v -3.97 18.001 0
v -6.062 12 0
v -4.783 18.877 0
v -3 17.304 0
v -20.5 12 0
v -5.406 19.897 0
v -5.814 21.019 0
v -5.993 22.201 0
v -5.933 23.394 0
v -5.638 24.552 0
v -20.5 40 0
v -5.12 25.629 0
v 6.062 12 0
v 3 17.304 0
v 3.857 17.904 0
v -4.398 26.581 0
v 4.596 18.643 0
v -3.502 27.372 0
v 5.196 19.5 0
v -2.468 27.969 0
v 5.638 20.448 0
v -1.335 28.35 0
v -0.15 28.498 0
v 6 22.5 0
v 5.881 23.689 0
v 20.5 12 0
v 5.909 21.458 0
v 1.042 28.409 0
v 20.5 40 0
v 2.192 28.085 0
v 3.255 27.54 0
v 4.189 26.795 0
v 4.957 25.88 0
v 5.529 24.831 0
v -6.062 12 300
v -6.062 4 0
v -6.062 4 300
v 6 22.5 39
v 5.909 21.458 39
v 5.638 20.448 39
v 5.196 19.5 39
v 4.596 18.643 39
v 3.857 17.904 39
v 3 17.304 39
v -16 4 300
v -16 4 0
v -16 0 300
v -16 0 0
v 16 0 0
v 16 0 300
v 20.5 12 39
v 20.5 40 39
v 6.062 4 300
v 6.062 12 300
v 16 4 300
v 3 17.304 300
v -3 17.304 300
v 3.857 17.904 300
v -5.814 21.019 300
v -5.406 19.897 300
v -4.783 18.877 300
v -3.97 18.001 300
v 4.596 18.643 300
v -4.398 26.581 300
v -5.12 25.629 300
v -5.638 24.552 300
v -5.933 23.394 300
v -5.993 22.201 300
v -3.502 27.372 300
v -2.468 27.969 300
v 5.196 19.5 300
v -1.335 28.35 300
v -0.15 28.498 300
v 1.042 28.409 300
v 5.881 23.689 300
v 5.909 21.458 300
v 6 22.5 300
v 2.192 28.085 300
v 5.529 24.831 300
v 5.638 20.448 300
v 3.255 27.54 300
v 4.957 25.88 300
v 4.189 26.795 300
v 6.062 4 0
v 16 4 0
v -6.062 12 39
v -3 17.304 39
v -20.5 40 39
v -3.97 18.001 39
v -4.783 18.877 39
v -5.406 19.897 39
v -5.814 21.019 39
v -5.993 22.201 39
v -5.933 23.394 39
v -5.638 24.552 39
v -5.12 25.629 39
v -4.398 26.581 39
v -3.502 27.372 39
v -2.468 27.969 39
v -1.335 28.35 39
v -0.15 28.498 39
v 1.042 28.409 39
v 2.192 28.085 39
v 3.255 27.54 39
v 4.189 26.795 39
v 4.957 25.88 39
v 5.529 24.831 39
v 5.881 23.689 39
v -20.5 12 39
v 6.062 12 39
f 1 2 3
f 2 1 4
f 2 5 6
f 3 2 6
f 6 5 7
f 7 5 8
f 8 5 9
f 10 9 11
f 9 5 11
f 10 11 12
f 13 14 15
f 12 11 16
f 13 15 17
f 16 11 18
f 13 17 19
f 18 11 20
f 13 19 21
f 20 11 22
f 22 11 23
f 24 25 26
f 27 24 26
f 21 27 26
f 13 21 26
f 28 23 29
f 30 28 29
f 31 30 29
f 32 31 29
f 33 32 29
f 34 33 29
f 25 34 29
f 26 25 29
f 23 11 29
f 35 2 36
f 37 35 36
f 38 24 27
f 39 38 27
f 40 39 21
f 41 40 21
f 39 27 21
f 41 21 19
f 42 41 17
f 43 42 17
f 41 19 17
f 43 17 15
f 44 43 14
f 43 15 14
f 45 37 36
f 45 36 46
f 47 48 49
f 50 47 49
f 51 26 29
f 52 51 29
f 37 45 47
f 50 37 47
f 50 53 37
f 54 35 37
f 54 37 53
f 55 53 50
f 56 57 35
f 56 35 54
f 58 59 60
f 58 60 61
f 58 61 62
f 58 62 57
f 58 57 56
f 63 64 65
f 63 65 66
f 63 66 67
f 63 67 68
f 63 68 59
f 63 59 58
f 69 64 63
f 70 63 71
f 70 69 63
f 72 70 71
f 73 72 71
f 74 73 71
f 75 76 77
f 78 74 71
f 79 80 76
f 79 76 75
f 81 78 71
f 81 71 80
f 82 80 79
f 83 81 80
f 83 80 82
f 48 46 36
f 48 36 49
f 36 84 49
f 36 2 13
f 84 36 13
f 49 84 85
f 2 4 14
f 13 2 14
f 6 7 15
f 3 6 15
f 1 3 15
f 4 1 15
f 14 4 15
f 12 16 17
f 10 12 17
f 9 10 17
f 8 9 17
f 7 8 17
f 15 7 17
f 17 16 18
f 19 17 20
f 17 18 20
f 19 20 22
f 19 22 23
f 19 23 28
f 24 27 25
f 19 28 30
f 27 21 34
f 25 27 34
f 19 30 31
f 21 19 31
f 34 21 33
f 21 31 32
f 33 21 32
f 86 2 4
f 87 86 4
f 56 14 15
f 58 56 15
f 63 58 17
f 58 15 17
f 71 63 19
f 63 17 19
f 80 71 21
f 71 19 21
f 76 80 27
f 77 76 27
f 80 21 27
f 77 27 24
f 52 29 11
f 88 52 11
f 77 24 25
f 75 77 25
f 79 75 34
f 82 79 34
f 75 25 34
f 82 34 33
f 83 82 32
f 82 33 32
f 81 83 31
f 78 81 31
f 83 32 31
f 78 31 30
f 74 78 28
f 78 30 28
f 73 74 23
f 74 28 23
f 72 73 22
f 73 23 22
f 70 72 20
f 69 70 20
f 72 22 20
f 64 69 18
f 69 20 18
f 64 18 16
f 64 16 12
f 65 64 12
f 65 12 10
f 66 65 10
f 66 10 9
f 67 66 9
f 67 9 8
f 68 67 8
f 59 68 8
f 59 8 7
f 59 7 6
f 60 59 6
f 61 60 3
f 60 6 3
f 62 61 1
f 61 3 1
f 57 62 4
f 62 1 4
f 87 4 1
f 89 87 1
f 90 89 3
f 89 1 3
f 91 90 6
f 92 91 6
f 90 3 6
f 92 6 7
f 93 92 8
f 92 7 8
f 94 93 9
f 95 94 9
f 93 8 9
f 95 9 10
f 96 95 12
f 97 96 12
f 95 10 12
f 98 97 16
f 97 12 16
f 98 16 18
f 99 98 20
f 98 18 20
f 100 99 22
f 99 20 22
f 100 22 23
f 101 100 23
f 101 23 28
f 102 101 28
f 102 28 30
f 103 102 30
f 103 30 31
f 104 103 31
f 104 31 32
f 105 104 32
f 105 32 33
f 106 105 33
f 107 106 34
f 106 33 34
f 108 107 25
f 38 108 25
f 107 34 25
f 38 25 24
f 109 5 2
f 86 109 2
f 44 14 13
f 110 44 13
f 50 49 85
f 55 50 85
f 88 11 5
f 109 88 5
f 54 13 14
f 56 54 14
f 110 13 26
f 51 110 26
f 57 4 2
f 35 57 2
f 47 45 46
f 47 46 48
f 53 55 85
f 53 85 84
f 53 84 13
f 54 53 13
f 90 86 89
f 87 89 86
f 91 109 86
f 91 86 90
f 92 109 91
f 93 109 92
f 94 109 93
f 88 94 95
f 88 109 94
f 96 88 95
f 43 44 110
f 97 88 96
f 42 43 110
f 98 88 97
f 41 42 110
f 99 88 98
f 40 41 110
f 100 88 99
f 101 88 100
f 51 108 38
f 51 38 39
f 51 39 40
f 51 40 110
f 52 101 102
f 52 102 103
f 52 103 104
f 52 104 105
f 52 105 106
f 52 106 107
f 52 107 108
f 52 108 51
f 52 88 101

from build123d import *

# Parameters (mm, degrees)
F1_DEPTH = 300
F2_DEPTH = 39


with BuildPart() as f1:
    # F0 (on Top) → F1 (new body)
    with BuildSketch(Plane.XY):
        with BuildLine():
            ThreePointArc((3, 17.303848), (5.196152, 19.5), (6, 22.5))
            ThreePointArc((6, 22.5), (-3, 27.696152), (-3, 17.303848))
            ThreePointArc((-3, 17.303848), (0, 16.5), (3, 17.303848))
        make_face()
        with BuildLine():
            ThreePointArc((3, 17.303848), (0, 16.5), (-3, 17.303848))
            Line((-3, 17.303848), (-6.062178, 12))
            Line((-6.062178, 12), (-6.062178, 4))
            Line((-6.062178, 4), (6.062178, 4))
            Line((6.062178, 4), (6.062178, 12))
            Line((6.062178, 12), (3, 17.303848))
        make_face()
        Polygon((6.062178, 4), (-6.062178, 4), (-16, 4), (-16, 0), (16, 0), (16, 4), align=None)
    extrude(amount=F1_DEPTH)


with BuildPart() as f2:
    # F0 (on Top) → F2 (new body)
    with BuildSketch(Plane.XY):
        with BuildLine():
            ThreePointArc((-3, 17.303848), (-3, 27.696152), (6, 22.5))
            ThreePointArc((6, 22.5), (5.196152, 19.5), (3, 17.303848))
            Line((3, 17.303848), (6.062178, 12))
            Line((6.062178, 12), (20.5, 12))
            Line((20.5, 12), (20.5, 40))
            Line((20.5, 40), (-20.5, 40))
            Line((-20.5, 40), (-20.5, 12))
            Line((-20.5, 12), (-6.062178, 12))
            Line((-6.062178, 12), (-3, 17.303848))
        make_face()
    extrude(amount=F2_DEPTH)


solid = Compound([f1.part, f2.part])
